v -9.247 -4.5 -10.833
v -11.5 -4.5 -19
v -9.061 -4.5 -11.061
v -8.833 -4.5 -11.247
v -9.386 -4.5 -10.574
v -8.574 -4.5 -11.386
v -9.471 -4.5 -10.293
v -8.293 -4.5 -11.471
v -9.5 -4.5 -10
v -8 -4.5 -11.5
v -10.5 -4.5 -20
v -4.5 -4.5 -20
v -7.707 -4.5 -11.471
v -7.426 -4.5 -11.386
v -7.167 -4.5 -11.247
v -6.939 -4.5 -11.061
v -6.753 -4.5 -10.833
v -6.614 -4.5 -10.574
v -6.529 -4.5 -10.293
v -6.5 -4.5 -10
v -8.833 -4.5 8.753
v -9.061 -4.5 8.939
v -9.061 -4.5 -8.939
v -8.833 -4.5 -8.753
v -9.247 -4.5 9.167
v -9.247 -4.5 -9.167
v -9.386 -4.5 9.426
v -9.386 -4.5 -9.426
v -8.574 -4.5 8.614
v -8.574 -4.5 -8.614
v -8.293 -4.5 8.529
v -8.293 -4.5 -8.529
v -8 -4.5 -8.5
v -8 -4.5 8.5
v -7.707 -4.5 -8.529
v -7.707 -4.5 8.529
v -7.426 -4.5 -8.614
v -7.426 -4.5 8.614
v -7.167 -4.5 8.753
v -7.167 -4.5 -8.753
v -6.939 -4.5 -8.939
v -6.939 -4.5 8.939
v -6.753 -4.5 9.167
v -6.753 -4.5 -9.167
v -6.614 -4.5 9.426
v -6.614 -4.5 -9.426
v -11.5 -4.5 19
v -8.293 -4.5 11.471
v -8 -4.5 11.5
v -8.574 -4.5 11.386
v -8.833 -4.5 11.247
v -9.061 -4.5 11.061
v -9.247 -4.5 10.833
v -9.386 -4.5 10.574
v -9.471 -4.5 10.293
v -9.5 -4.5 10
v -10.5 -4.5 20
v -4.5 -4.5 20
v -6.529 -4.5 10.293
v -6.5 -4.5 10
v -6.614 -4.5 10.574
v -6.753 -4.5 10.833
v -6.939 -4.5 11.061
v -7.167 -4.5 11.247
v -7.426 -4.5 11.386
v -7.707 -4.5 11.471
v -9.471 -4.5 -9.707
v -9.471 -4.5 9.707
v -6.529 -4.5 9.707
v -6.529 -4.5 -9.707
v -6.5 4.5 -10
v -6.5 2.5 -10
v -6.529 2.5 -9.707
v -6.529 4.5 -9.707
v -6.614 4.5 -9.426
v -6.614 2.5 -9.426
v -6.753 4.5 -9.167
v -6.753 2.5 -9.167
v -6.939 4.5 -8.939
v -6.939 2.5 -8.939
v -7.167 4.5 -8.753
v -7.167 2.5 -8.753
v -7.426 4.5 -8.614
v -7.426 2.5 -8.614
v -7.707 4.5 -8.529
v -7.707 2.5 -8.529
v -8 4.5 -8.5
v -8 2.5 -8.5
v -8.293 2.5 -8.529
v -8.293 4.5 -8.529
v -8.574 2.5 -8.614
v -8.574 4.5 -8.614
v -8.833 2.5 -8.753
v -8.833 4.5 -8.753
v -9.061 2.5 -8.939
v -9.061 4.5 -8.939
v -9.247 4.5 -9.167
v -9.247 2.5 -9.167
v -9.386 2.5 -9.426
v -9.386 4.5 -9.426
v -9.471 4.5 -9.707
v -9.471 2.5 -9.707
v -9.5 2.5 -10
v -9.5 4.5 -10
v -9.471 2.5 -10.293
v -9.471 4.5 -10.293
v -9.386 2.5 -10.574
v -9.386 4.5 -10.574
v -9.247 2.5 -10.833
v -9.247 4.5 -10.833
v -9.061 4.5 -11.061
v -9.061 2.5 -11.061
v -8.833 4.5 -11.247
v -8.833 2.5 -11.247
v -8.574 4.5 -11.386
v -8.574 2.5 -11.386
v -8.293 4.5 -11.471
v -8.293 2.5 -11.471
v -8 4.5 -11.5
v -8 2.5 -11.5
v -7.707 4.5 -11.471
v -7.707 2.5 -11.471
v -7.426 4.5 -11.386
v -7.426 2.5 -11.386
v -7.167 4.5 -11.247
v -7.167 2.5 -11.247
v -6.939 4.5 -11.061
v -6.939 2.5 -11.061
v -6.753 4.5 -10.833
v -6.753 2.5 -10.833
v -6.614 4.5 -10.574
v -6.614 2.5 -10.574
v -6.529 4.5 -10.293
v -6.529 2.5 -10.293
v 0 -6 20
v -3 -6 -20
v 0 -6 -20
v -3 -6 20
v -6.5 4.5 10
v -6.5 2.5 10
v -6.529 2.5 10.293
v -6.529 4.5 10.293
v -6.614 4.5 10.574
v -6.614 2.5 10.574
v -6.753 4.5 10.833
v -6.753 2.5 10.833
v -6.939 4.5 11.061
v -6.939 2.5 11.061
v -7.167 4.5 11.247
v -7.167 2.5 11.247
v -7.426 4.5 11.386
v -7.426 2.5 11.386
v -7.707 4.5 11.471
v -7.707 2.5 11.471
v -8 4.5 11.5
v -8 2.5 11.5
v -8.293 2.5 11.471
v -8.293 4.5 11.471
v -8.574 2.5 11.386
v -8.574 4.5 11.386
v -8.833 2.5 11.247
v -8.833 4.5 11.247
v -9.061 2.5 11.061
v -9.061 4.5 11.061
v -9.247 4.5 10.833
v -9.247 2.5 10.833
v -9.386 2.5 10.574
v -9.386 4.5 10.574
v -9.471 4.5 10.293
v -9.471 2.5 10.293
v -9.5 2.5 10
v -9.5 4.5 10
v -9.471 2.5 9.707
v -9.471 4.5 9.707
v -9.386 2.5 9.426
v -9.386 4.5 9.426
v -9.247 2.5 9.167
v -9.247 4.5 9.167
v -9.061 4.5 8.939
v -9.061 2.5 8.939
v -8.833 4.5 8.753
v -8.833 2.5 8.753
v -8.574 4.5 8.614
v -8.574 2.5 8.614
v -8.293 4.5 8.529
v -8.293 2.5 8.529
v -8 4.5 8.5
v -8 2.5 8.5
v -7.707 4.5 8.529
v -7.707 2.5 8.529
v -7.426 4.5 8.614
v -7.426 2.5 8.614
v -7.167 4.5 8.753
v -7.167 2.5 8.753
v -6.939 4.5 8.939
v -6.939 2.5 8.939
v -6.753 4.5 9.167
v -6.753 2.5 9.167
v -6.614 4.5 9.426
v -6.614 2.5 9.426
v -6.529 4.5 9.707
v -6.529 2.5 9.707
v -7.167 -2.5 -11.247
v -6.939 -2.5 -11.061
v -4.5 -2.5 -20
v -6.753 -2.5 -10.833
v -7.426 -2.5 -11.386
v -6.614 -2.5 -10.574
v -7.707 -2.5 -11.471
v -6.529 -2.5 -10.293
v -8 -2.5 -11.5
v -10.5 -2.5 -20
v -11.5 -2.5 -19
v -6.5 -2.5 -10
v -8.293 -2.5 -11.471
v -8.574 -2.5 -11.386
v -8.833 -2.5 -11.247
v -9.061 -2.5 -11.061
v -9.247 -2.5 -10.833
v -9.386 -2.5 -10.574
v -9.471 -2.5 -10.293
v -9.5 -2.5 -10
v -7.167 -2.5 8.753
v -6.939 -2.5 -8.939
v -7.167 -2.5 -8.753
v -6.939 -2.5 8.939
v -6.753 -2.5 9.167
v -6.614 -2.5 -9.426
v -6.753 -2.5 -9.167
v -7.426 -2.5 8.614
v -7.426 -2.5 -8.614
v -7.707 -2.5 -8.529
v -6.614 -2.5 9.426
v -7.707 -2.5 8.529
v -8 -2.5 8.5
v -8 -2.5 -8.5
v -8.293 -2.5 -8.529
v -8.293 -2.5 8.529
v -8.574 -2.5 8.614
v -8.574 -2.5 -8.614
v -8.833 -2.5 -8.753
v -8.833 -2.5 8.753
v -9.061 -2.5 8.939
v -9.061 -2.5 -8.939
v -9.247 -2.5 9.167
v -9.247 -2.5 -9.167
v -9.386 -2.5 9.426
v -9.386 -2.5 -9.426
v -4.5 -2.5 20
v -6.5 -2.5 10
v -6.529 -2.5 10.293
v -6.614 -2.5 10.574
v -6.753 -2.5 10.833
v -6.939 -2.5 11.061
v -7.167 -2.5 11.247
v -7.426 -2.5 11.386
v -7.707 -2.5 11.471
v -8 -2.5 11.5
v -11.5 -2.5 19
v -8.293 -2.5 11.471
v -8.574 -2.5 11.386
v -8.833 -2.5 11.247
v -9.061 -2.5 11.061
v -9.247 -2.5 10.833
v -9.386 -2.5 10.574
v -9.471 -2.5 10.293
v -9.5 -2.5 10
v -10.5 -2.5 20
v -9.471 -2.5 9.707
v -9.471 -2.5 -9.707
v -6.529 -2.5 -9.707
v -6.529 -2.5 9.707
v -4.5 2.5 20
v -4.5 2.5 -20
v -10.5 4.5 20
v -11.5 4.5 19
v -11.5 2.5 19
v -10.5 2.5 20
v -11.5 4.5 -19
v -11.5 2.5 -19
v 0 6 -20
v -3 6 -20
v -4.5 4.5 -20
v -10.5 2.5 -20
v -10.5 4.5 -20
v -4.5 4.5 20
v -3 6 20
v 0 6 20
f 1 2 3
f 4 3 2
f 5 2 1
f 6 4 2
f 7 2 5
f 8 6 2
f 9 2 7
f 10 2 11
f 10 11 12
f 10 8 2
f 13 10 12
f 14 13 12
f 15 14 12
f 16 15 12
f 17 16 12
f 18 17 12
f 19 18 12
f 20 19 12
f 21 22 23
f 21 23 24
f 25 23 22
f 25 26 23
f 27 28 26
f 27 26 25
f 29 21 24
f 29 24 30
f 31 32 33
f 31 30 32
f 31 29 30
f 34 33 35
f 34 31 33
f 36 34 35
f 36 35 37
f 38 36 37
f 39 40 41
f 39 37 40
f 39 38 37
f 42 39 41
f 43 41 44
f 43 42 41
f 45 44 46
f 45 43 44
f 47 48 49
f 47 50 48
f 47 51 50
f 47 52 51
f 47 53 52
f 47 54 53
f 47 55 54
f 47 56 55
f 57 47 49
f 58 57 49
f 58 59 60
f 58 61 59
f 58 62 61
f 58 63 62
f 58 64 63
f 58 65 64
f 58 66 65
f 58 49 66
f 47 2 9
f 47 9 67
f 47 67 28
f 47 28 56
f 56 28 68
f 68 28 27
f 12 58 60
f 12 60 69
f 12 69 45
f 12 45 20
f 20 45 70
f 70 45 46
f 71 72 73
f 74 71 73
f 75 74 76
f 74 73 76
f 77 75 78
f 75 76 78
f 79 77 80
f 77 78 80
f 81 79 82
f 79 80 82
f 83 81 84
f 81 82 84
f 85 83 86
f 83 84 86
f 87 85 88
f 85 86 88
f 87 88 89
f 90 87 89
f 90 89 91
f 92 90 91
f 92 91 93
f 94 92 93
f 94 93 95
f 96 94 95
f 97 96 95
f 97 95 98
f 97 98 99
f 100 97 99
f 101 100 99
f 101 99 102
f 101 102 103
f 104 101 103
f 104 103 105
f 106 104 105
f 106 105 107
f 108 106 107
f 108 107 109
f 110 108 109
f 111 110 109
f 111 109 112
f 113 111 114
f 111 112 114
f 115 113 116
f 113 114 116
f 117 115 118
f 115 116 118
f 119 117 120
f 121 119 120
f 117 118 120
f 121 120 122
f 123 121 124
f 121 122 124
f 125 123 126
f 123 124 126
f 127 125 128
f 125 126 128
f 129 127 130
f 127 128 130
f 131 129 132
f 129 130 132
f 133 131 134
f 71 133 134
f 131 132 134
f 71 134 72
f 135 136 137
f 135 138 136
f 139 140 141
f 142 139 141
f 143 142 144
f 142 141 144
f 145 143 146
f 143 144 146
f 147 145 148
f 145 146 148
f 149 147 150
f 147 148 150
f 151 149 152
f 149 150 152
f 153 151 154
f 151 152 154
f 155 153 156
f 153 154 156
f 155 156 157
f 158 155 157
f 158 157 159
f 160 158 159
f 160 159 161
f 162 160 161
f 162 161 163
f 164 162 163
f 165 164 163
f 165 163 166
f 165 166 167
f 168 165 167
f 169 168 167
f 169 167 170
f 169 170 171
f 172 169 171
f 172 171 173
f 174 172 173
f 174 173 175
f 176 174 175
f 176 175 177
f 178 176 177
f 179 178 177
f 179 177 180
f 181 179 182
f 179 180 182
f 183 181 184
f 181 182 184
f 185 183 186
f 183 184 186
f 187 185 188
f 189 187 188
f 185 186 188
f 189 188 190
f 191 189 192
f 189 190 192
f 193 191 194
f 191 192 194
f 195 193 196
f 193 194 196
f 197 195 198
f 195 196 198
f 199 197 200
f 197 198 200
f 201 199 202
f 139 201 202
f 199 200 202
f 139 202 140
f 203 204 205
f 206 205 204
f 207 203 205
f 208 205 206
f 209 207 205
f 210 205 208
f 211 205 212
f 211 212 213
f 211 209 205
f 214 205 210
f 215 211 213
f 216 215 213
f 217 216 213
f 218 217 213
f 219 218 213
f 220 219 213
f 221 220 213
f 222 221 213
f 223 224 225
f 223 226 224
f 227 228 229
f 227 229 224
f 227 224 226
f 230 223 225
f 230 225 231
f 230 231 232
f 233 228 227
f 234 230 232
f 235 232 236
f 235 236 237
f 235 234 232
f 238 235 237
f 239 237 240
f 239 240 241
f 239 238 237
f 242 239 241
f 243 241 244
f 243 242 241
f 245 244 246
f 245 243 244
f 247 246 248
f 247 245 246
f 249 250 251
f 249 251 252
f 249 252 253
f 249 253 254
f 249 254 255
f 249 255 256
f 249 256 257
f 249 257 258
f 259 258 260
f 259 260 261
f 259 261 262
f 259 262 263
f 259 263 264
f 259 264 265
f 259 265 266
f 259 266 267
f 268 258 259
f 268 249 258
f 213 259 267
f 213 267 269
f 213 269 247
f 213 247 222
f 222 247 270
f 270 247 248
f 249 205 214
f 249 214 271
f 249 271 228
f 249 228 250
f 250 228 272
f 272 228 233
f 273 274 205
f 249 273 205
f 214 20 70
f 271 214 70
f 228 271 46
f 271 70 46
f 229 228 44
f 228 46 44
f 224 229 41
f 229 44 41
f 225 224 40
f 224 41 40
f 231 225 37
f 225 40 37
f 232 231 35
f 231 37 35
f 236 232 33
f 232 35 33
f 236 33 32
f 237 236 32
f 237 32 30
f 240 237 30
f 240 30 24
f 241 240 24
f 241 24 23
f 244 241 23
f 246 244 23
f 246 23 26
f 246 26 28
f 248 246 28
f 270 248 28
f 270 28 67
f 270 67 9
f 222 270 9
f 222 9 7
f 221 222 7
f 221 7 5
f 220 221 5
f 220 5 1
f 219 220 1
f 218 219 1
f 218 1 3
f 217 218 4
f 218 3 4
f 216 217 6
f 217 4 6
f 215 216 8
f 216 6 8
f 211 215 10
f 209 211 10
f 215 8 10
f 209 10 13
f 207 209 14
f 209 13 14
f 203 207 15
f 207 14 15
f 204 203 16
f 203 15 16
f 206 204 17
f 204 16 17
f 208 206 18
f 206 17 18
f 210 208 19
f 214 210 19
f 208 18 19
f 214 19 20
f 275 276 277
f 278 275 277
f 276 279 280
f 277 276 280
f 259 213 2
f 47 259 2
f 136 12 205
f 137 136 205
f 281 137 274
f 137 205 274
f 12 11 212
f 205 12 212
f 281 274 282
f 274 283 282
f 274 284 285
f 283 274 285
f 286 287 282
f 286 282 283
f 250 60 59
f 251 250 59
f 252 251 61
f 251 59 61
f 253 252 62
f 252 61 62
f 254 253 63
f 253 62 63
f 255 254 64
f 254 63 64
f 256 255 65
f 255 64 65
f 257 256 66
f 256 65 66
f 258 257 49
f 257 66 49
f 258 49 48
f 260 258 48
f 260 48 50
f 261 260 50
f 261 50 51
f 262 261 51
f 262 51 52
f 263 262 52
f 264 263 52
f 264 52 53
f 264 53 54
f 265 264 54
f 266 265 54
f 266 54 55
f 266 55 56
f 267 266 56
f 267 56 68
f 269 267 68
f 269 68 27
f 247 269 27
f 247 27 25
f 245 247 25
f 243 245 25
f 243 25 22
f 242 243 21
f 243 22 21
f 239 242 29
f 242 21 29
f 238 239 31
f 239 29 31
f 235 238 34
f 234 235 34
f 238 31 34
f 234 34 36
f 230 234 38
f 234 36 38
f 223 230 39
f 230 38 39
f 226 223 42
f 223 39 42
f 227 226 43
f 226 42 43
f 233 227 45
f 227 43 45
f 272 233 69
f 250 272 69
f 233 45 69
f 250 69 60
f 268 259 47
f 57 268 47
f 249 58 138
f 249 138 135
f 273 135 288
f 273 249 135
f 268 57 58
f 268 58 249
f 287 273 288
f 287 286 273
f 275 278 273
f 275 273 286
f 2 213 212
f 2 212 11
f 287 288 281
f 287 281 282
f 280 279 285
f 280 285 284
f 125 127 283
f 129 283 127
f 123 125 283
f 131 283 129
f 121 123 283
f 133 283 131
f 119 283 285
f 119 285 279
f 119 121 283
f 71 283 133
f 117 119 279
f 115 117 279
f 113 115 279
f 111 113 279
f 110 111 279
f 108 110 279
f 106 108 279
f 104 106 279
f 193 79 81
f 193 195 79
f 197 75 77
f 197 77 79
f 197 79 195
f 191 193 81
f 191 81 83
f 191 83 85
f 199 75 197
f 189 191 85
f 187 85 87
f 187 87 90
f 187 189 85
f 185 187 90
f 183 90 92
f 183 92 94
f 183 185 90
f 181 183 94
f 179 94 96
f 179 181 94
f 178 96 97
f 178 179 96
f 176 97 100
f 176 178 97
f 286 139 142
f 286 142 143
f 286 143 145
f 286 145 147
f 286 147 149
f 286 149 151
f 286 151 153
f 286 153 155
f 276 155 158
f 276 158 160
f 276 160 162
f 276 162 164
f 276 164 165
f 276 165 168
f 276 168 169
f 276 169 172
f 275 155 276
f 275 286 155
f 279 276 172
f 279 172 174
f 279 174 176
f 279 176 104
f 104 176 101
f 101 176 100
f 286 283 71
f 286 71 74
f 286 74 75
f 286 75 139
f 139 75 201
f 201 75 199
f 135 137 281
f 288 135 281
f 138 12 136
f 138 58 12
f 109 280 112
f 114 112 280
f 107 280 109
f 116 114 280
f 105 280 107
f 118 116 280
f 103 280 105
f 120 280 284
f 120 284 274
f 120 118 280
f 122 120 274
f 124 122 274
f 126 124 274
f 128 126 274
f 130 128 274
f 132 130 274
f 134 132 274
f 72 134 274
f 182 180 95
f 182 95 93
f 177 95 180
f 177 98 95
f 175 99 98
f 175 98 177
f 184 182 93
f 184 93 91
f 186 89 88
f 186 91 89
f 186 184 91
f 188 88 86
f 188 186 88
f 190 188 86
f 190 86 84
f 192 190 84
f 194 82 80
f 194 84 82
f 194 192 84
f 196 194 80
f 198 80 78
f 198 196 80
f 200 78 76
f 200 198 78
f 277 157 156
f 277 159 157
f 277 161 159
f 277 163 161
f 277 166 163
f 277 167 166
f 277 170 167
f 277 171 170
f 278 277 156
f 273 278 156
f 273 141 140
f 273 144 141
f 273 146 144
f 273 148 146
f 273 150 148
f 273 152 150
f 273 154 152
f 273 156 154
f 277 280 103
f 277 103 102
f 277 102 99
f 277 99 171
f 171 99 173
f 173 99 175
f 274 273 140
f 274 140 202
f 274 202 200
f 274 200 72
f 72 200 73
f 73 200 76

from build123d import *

# Parameters (mm, degrees)
SALIENTE_EXTRUIR1_DEPTH      = 20
TALADRO_DE_MARGEN_PARA_M31_D = 3
CHAFL_N2_SIZE                = 1


with BuildPart() as part:
    # Croquis1 → Saliente-Extruir1 (new, symmetric)
    with BuildSketch(Plane(origin=(0, 0, 0), x_dir=(0, 1, 0), z_dir=(0, 0, 1))):
        Polygon((-6, 0), (6, 0), (6, 3), (4.5, 4.5), (4.5, 11.5), (2.5, 11.5), (2.5, 4.5), (-2.5, 4.5), (-2.5, 11.5), (-4.5, 11.5), (-4.5, 4.5), (-6, 3), align=None)
    extrude(amount=SALIENTE_EXTRUIR1_DEPTH, both=True)

    # Taladro de margen para M31 (through all)
    with Locations(Plane(origin=(0, 4.5, 0), x_dir=(-1, 0, 0), z_dir=(0, 1, 0))):
        with Locations((8, -10), (8, 10)):
            Hole(TALADRO_DE_MARGEN_PARA_M31_D / 2)

    # Chaflán2
    chafl_n2_edges = [part.edges().sort_by_distance(p)[0] for p in [
        (-11.5, -3.5, -20),
        (-11.5, 3.5, -20),
        (-11.5, 3.5, 20),
        (-11.5, -3.5, 20),
    ]]
    chamfer(chafl_n2_edges, length=CHAFL_N2_SIZE)


solid = part.part
